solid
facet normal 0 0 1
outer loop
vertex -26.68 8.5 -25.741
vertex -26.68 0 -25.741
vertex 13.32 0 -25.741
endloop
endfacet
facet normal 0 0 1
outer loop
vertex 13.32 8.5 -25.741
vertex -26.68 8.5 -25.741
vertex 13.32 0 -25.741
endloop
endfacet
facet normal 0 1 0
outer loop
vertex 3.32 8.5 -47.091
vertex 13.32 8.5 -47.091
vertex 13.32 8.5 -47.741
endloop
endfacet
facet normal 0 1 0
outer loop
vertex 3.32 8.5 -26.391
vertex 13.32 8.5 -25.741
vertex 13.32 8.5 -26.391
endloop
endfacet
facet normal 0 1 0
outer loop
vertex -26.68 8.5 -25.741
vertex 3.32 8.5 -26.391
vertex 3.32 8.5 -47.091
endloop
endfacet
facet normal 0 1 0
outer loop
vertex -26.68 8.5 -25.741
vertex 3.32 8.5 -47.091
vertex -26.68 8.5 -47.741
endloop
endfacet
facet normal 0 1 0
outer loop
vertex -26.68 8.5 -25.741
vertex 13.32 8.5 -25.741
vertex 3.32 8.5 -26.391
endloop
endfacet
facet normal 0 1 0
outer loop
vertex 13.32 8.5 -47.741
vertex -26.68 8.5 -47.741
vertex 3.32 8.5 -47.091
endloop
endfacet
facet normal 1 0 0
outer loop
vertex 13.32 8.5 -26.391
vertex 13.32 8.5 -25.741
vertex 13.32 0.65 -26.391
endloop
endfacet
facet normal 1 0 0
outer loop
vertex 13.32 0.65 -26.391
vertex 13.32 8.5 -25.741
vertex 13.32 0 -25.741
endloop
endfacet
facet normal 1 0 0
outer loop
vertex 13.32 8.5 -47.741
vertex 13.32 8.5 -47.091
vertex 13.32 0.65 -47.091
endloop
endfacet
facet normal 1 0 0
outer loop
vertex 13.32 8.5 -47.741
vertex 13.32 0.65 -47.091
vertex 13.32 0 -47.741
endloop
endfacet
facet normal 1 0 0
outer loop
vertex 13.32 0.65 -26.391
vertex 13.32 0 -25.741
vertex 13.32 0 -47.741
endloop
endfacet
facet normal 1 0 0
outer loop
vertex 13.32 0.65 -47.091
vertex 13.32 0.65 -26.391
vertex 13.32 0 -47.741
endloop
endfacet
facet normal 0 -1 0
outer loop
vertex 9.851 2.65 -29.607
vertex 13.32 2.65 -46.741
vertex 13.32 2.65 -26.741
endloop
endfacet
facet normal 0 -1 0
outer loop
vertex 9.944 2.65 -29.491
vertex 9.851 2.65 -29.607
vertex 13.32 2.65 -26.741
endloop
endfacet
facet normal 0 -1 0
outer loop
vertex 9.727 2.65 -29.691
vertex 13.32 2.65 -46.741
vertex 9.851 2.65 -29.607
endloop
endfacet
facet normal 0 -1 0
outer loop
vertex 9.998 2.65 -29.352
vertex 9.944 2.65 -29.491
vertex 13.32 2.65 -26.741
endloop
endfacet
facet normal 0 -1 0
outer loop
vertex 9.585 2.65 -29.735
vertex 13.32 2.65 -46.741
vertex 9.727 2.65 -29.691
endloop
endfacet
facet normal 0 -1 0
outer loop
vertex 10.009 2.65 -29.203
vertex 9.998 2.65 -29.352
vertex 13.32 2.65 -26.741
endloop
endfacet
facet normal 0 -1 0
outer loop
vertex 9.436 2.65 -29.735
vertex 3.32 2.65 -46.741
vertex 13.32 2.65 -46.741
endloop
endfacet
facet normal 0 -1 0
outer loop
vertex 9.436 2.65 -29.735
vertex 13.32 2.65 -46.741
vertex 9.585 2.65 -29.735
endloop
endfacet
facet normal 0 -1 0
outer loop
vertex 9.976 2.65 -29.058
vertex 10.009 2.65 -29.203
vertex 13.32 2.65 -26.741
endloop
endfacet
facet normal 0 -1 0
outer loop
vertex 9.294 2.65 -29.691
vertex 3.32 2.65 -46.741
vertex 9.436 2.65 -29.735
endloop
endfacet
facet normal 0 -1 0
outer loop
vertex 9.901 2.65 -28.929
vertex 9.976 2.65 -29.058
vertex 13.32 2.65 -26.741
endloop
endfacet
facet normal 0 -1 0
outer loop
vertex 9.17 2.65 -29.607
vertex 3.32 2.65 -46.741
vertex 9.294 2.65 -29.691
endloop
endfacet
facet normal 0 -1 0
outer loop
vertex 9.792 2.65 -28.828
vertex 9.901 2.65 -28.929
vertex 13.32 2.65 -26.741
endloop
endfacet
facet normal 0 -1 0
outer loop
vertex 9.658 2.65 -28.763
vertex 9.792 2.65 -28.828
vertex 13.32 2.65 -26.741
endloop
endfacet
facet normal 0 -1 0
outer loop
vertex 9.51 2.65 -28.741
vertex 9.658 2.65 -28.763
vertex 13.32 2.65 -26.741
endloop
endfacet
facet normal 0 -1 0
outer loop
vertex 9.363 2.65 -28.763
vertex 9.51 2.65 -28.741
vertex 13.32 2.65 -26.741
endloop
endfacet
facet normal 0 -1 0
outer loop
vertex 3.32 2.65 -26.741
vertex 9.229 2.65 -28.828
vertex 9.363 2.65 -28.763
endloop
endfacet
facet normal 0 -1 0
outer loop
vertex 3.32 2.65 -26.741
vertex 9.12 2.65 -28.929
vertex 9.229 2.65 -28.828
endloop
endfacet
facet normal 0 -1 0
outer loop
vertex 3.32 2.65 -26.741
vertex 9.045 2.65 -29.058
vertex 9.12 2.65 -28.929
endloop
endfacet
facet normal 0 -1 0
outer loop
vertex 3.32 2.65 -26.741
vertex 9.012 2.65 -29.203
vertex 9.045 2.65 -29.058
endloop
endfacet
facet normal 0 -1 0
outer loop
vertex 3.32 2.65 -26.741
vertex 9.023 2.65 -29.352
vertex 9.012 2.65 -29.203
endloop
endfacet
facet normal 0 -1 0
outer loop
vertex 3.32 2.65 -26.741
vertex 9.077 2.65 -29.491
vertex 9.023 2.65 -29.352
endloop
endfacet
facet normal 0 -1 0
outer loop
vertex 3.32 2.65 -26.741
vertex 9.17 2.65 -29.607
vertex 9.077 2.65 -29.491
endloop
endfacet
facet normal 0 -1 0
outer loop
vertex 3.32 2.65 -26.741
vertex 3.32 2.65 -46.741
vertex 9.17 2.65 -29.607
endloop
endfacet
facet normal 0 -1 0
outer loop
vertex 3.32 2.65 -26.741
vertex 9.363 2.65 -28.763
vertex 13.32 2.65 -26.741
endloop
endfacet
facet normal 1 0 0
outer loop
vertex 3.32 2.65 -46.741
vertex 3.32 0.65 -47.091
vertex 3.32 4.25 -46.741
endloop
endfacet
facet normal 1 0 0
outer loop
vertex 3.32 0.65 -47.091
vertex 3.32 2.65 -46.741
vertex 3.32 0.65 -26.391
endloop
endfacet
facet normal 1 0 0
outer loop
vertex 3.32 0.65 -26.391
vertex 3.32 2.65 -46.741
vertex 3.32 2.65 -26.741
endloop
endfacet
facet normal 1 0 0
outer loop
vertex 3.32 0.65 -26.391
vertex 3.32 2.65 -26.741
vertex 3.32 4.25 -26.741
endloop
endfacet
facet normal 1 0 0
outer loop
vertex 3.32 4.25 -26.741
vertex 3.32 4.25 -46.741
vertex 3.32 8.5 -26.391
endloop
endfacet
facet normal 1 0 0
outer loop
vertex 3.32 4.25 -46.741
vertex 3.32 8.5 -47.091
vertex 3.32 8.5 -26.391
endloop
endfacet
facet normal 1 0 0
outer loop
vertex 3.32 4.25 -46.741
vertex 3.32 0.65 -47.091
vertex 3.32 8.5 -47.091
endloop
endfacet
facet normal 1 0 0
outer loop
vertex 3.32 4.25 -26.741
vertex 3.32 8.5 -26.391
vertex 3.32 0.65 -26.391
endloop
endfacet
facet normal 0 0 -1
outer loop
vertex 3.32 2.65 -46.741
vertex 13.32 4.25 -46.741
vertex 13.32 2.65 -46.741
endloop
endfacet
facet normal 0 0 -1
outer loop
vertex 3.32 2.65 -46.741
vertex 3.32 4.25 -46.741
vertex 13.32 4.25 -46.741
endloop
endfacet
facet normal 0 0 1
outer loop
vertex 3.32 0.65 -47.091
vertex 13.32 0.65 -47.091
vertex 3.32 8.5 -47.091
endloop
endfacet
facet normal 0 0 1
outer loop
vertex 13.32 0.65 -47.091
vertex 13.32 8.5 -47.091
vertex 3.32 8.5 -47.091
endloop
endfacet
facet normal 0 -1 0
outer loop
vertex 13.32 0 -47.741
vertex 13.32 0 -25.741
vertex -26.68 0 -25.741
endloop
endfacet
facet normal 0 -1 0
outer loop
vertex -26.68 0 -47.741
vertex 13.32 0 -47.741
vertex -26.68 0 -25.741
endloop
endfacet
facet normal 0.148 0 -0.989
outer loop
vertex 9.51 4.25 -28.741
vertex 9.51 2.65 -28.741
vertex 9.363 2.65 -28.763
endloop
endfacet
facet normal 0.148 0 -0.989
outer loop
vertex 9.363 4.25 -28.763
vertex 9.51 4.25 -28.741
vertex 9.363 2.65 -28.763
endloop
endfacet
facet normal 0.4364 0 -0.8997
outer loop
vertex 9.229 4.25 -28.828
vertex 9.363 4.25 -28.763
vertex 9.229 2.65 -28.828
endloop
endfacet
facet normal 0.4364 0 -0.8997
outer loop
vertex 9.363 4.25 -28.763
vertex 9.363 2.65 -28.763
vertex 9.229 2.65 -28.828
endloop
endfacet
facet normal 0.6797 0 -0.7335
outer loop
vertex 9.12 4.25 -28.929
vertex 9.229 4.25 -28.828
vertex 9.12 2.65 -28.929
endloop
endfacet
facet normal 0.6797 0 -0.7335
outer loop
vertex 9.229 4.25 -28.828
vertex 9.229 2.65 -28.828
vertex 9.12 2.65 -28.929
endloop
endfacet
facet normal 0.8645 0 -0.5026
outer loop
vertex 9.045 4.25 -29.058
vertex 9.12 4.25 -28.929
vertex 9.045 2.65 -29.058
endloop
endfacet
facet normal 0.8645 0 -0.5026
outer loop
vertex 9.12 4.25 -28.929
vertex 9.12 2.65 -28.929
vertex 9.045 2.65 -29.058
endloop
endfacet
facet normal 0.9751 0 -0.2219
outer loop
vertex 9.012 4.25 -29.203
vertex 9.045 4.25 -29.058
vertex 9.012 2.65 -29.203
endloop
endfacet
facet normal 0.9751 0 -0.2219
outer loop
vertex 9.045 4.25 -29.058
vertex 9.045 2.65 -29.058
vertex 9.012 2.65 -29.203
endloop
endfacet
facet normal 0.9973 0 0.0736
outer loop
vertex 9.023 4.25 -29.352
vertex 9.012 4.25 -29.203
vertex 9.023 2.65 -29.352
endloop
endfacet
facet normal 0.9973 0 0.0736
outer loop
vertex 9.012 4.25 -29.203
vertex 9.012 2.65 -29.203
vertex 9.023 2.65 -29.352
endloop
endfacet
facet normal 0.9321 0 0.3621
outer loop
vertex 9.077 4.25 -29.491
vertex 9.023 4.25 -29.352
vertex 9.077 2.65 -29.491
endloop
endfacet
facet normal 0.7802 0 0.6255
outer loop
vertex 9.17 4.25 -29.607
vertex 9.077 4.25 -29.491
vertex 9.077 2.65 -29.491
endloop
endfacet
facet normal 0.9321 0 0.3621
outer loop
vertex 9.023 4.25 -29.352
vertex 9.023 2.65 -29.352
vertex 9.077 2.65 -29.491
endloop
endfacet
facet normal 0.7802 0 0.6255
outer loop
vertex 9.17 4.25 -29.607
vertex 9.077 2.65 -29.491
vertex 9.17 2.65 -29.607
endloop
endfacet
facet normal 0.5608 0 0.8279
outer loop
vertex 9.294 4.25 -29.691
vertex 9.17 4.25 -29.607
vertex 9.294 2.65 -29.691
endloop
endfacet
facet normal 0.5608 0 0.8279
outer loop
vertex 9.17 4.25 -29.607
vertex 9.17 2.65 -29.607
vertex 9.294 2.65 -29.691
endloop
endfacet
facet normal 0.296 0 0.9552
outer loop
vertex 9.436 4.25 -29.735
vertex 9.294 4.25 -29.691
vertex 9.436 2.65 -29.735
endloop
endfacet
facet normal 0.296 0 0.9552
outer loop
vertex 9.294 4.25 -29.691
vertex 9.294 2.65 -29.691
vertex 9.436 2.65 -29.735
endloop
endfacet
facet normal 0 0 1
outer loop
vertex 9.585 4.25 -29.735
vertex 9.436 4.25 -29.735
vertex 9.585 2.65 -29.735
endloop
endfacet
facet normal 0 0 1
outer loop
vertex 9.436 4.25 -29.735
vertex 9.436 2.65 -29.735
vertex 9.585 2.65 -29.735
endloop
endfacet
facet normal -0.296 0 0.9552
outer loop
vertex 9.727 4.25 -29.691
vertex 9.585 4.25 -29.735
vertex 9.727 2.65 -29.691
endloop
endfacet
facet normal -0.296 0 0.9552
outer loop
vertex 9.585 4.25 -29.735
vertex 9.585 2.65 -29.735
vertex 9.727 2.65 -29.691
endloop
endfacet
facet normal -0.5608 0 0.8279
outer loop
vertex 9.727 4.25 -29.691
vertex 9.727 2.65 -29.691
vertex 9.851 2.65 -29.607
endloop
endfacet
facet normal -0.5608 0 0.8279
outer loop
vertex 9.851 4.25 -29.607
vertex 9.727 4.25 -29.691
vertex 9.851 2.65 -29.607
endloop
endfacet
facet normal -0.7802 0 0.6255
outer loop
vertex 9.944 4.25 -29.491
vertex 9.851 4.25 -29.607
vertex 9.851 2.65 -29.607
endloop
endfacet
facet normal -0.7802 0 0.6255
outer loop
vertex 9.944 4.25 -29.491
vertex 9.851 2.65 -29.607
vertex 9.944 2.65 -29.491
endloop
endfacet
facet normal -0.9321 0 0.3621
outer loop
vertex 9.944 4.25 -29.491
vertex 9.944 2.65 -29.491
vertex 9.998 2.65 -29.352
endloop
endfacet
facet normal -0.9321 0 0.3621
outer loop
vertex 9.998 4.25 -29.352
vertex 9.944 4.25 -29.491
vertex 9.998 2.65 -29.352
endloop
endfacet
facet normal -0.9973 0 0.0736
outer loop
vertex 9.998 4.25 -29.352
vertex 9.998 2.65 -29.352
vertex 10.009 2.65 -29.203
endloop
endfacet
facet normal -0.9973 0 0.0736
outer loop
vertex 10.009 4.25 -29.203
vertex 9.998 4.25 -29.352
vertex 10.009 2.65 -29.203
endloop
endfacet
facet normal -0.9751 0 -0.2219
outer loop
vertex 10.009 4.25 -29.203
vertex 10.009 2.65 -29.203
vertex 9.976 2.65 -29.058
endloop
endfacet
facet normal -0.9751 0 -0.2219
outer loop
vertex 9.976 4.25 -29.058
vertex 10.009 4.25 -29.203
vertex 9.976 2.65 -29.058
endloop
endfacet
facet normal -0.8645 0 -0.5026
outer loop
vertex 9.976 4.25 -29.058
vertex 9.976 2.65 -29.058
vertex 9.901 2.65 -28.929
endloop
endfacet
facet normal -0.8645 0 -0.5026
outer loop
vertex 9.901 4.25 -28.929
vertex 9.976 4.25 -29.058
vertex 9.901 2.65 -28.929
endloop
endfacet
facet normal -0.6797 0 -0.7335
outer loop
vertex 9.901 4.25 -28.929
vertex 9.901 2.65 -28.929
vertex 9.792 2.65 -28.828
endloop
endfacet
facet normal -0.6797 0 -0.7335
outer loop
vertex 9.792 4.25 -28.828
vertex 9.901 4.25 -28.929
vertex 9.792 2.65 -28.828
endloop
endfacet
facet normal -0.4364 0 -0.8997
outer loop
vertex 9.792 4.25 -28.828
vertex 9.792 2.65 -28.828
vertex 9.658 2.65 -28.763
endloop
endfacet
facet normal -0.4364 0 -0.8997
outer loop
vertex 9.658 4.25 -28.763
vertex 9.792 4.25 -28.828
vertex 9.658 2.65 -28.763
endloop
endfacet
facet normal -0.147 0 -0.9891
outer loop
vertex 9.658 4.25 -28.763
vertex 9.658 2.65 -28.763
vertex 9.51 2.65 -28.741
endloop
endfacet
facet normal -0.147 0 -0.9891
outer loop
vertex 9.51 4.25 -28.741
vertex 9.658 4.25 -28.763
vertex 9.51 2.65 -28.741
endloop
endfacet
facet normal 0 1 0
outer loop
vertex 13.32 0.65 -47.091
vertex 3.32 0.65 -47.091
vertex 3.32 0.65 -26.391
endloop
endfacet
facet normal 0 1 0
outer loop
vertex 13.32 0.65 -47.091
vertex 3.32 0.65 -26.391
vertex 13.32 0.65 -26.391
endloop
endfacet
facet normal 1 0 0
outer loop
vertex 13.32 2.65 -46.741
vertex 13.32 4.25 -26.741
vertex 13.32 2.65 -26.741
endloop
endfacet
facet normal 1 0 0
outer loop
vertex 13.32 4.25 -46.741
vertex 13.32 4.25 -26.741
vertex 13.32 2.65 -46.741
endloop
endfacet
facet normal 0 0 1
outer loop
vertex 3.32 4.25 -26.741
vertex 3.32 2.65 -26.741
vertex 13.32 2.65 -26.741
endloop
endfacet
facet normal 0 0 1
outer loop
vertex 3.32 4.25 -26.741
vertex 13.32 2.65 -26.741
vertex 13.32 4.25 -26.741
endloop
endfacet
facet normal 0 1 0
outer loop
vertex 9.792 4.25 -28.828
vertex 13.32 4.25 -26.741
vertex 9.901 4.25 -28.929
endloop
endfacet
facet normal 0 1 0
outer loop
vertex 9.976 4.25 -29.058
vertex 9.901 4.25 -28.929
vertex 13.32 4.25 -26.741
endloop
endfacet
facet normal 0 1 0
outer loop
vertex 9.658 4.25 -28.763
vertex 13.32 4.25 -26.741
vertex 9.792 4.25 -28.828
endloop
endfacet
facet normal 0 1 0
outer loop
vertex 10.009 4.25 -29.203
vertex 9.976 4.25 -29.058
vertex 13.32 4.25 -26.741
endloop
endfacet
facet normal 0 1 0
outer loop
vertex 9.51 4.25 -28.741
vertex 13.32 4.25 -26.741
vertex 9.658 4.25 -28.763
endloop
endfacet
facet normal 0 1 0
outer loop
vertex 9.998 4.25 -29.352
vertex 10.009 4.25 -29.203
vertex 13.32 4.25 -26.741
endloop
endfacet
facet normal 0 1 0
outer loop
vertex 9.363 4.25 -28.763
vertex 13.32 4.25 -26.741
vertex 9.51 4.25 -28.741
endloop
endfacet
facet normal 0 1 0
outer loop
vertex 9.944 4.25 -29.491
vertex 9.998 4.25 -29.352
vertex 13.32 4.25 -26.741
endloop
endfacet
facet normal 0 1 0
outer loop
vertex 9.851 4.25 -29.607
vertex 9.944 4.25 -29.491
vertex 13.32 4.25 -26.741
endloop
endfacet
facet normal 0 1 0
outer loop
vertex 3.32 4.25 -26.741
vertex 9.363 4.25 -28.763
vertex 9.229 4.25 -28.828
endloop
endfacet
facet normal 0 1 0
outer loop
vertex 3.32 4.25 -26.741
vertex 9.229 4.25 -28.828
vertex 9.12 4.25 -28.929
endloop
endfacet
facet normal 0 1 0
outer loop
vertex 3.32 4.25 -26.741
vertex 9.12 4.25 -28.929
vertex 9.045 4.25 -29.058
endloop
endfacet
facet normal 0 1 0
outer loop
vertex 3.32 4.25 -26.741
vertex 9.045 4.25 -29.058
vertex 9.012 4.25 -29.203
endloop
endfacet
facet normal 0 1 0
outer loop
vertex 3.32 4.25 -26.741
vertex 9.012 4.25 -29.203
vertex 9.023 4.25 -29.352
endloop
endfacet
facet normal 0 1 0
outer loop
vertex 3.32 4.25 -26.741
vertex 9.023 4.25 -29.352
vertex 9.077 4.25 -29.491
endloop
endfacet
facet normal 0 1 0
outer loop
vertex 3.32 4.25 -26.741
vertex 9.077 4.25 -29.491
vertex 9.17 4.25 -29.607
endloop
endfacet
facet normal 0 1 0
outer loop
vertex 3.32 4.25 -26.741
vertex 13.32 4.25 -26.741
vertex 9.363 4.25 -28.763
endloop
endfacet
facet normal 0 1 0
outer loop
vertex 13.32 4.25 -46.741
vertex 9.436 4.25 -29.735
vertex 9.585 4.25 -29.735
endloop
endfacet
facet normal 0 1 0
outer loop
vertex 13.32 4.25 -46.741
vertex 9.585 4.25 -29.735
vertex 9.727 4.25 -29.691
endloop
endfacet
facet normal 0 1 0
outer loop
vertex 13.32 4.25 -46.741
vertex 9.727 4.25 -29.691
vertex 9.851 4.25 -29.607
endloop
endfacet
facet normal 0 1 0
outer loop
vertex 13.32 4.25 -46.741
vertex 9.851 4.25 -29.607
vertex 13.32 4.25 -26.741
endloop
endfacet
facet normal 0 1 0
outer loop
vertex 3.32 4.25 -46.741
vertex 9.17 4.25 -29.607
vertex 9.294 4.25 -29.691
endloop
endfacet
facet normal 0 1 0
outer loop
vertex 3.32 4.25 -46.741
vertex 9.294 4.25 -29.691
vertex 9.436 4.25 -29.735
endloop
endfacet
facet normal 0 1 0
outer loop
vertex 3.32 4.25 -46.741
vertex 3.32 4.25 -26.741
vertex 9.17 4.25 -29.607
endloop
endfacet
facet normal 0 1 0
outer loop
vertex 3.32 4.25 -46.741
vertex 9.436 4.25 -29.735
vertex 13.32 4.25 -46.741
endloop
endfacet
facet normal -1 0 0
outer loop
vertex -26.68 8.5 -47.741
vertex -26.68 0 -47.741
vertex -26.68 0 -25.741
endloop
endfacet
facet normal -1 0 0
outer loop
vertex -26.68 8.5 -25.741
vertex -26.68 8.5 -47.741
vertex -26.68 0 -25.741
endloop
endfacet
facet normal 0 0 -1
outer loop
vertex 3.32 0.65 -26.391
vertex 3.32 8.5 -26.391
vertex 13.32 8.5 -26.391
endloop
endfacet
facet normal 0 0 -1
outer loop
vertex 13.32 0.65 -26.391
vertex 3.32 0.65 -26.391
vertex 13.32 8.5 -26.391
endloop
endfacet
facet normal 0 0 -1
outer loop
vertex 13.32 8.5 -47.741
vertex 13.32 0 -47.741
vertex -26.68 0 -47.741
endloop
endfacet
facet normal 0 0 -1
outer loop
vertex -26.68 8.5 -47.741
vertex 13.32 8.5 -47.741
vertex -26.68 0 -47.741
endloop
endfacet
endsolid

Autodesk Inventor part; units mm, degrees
ref_plane "YZ Plane" through (0, 0, 0) normal (1, 0, 0) x (0, 1, 0)
ref_plane "XZ Plane" through (0, 0, 0) normal (0, 1, 0) x (-1, 0, 0)
ref_plane "XY Plane" through (0, 0, 0) normal (0, 0, 1) x (1, 0, 0)
sketch "Sketch1" plane through (0, 0, 0) normal (0, 1, 0) x (-1, 0, 0)
  line L0 (26.6795, -25.7407) -> (-13.3205, -25.7407)
  line L1 (-13.3205, -25.7407) -> (-13.3205, -47.7407)
  line L2 (-13.3205, -47.7407) -> (26.6795, -47.7407)
  line L3 (26.6795, -47.7407) -> (26.6795, -25.7407)
  dimension "d0" = 40
  dimension "d1" = 22
extrude "Extrusion1" add sketch "Sketch1" along normal blind 8.5
sketch "Sketch2" plane through (0, 8.5, 0) normal (0, 1, 0) x (1, 0, 0)
  line L0 (13.3205, 25.7407) -> (13.3205, 47.7407) projected
  line L1 (13.3205, 47.0907) -> (3.3205, 47.0907)
  line L2 (3.3205, 47.0907) -> (3.3205, 26.3907)
  line L3 (3.3205, 26.3907) -> (13.3205, 26.3907)
  line L4 (13.3205, 26.3907) -> (13.3205, 47.0907)
  line L5 (13.3205, 47.7407) -> (-26.6795, 47.7407) projected
  line L6 (-26.6795, 25.7407) -> (13.3205, 25.7407) projected
  point P0 (13.3205, 26.3907)
  point P1 (8.3205, 47.0907)
  dimension "d6" = 10
  dimension "d23" = 0.65
  dimension "d24" = 0.65
extrude "Extrusion2" cut sketch "Sketch2" against normal blind 7.85
sketch "Sketch3" plane through (3.3205, 8.5, -26.3907) normal (1, 0, 0) x (0, 0, -1)
  line L0 (0.35, -4.25) -> (20.35, -4.25)
  line L1 (20.35, -4.25) -> (20.35, -5.85)
  line L2 (20.35, -5.85) -> (0.35, -5.85)
  line L3 (0.35, -5.85) -> (0.35, -4.25)
  line L4 (20.35, -5.05) -> (20.7, -5.05) construction
  line L5 (20.7, 0) -> (20.7, -7.85) construction
  line L6 (0.35, -5.05) -> (0, -5.05) construction
  line L7 (0, -7.85) -> (0, 0) construction
  line L8 (20.7, -7.85) -> (0, -7.85) construction
  dimension "d9" = 1.6
  dimension "d10" = 2
  dimension "d25" = 20
extrude "Extrusion3" add sketch "Sketch3" along normal up to surface (10 mm away)
sketch "Sketch4" plane through (3.3205, 4.25, -26.7407) normal (0, 1, 0) x (1, 0, 0)
  line L0 (0, 0) -> (10, 0) projected
  line L1 (10, 0) -> (10, 20) projected
  point P0 (-3.3205, -26.7407)
  point P1 (6.19, 2.5)
  dimension "d13" = 2.5
  dimension "d26" = 3.81
hole "Hole1" at (9.5105, 4.25, -29.2407) direction (0, -1, 0) diameter 1 depth 1.6
sketch "Sketch5" plane through (0, 8.5, 0) normal (0, 1, 0) x (1, 0, 0)
  line L0 (-26.3216, 47.7407) -> (3.3205, 47.7407) construction
  line L1 (3.3205, 47.7407) -> (3.3205, 25.7407) construction
  line L2 (3.3205, 25.7407) -> (-26.3216, 25.7407) construction
  line L3 (-26.3216, 25.7407) -> (-26.3216, 47.7407) construction
  line L4 (13.3205, 47.7407) -> (-26.6795, 47.7407) projected
  line L5 (3.3205, 26.3907) -> (3.3205, 47.0907) projected
  point P0 (3.3205, 36.7407)
decal "Decal1"
properties part number "Flysky FS-iA6 Receiver"
